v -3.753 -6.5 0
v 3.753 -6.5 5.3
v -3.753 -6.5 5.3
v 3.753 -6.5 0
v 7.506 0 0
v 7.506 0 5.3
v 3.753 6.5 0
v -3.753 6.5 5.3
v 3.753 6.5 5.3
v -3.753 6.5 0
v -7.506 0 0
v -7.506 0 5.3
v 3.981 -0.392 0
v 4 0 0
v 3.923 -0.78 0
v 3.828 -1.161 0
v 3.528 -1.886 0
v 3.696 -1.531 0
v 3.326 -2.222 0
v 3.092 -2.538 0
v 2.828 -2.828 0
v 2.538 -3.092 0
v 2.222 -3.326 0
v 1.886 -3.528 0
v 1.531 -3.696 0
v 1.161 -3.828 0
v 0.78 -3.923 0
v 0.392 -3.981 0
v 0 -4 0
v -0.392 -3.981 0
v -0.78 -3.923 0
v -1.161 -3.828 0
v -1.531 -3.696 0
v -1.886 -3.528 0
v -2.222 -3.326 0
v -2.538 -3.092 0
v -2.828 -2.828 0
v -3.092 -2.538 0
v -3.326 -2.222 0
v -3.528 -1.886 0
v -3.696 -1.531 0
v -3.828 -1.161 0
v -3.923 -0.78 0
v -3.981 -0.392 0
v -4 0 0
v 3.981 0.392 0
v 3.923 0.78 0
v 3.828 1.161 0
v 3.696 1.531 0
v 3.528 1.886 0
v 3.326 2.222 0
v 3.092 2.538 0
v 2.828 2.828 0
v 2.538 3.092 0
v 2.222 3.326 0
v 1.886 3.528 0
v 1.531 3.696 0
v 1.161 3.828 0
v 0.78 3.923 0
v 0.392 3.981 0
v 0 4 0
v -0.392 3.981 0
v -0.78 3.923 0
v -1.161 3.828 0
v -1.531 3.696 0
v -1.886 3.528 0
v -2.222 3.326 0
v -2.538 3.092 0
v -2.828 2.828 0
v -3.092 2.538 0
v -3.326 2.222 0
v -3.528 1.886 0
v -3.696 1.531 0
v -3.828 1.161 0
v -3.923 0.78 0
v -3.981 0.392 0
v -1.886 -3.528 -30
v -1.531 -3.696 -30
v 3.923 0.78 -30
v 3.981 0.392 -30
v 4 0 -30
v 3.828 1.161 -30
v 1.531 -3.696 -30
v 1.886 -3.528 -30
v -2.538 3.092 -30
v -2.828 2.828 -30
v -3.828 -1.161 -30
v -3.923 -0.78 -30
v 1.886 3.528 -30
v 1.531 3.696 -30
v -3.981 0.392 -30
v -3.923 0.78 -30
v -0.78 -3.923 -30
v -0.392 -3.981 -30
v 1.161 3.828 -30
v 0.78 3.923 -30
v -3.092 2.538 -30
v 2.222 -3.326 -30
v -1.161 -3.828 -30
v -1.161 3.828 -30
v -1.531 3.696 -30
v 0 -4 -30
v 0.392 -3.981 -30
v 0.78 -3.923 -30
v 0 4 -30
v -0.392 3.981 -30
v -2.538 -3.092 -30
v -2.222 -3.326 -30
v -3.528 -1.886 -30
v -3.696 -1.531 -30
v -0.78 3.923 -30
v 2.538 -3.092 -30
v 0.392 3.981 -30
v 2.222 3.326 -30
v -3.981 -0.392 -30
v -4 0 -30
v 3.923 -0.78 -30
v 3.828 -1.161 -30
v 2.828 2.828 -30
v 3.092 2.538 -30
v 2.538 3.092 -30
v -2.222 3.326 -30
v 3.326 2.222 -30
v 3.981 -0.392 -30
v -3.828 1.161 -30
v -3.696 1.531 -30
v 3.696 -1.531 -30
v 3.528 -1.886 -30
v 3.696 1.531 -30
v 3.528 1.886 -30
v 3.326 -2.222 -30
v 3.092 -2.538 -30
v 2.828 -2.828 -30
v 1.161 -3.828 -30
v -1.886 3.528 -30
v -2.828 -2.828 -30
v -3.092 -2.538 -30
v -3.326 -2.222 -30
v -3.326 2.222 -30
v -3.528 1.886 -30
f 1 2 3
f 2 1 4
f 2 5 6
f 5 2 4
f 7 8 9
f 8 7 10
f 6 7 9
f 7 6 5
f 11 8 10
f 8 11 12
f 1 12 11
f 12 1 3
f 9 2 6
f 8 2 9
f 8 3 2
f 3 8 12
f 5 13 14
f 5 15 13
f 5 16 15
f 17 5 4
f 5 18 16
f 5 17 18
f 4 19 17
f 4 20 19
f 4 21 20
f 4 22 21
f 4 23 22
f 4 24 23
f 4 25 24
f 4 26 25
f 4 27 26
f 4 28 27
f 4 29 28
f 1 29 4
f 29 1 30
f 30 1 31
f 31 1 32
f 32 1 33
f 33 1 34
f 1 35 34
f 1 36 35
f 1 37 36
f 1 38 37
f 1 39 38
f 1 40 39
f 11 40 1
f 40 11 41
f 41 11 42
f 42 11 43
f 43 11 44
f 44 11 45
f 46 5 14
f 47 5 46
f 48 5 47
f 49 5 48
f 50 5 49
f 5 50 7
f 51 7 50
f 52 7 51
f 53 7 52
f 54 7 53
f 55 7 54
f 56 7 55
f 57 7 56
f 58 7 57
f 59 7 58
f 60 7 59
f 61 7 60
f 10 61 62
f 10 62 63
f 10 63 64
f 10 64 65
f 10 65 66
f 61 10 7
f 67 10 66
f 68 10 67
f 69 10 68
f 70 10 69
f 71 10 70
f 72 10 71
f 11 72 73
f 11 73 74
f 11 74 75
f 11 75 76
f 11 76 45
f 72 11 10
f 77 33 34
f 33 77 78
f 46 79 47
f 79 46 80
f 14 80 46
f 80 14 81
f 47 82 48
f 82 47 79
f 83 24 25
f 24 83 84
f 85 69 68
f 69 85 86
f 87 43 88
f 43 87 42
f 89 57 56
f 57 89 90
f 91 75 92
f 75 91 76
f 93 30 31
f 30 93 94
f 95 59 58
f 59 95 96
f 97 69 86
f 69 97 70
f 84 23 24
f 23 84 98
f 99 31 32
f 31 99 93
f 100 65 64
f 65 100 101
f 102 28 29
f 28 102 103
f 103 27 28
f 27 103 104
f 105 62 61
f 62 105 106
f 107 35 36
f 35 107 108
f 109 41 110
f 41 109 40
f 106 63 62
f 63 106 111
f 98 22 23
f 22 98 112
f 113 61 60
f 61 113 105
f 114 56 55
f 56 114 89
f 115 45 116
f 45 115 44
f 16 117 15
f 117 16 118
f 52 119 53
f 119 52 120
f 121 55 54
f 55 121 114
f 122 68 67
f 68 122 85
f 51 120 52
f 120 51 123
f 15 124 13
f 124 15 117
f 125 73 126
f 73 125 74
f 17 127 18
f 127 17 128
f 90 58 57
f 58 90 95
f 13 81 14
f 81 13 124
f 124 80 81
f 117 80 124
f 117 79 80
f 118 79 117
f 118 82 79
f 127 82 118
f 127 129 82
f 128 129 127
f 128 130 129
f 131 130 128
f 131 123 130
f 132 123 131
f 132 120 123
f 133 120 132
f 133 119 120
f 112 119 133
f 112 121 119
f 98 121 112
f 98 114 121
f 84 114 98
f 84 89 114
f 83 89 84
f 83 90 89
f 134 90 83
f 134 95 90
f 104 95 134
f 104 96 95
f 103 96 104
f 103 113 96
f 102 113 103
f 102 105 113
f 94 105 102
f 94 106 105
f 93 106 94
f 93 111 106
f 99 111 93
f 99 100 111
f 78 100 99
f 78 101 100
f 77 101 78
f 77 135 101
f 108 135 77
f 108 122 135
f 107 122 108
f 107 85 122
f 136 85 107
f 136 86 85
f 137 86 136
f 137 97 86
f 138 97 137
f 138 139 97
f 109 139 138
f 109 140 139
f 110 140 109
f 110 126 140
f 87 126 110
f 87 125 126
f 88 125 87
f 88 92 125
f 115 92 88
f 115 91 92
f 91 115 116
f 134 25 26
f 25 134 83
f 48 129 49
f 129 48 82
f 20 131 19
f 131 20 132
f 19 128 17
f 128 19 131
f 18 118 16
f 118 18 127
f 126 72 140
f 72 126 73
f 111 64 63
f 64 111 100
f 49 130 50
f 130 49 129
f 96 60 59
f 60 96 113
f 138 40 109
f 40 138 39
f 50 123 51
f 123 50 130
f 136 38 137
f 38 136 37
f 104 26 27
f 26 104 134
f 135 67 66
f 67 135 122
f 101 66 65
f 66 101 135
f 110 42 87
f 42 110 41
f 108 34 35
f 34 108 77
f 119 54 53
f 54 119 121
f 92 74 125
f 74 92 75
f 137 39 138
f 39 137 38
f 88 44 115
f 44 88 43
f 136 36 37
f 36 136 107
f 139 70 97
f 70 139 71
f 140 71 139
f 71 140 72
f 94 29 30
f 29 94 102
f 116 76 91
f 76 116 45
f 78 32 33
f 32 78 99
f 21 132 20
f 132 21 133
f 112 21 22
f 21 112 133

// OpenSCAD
$fn = 64;

// Head: hexagonal prism, across-flats 13 mm, height 5.3 mm
// Bottom of head at z=0, top at z=5.3
// Shank: diameter 8 mm, length 30 mm, extending downward (z<0)

module hex_bolt() {
    af = 13;            // across-flats distance
    r_hex = af / 2 / cos(30);  // circumradius of regular hexagon
    h_head = 5.3;
    d_shank = 8;
    l_shank = 30;

    // Head (z = 0 to 5.3)
    translate([0, 0, h_head / 2])
        cylinder(h = h_head, r = r_hex, $fn = 6, center = true);

    // Shank (z = 0 to -30)
    translate([0, 0, -l_shank / 2])
        cylinder(h = l_shank, d = d_shank, center = true);
}

hex_bolt();
